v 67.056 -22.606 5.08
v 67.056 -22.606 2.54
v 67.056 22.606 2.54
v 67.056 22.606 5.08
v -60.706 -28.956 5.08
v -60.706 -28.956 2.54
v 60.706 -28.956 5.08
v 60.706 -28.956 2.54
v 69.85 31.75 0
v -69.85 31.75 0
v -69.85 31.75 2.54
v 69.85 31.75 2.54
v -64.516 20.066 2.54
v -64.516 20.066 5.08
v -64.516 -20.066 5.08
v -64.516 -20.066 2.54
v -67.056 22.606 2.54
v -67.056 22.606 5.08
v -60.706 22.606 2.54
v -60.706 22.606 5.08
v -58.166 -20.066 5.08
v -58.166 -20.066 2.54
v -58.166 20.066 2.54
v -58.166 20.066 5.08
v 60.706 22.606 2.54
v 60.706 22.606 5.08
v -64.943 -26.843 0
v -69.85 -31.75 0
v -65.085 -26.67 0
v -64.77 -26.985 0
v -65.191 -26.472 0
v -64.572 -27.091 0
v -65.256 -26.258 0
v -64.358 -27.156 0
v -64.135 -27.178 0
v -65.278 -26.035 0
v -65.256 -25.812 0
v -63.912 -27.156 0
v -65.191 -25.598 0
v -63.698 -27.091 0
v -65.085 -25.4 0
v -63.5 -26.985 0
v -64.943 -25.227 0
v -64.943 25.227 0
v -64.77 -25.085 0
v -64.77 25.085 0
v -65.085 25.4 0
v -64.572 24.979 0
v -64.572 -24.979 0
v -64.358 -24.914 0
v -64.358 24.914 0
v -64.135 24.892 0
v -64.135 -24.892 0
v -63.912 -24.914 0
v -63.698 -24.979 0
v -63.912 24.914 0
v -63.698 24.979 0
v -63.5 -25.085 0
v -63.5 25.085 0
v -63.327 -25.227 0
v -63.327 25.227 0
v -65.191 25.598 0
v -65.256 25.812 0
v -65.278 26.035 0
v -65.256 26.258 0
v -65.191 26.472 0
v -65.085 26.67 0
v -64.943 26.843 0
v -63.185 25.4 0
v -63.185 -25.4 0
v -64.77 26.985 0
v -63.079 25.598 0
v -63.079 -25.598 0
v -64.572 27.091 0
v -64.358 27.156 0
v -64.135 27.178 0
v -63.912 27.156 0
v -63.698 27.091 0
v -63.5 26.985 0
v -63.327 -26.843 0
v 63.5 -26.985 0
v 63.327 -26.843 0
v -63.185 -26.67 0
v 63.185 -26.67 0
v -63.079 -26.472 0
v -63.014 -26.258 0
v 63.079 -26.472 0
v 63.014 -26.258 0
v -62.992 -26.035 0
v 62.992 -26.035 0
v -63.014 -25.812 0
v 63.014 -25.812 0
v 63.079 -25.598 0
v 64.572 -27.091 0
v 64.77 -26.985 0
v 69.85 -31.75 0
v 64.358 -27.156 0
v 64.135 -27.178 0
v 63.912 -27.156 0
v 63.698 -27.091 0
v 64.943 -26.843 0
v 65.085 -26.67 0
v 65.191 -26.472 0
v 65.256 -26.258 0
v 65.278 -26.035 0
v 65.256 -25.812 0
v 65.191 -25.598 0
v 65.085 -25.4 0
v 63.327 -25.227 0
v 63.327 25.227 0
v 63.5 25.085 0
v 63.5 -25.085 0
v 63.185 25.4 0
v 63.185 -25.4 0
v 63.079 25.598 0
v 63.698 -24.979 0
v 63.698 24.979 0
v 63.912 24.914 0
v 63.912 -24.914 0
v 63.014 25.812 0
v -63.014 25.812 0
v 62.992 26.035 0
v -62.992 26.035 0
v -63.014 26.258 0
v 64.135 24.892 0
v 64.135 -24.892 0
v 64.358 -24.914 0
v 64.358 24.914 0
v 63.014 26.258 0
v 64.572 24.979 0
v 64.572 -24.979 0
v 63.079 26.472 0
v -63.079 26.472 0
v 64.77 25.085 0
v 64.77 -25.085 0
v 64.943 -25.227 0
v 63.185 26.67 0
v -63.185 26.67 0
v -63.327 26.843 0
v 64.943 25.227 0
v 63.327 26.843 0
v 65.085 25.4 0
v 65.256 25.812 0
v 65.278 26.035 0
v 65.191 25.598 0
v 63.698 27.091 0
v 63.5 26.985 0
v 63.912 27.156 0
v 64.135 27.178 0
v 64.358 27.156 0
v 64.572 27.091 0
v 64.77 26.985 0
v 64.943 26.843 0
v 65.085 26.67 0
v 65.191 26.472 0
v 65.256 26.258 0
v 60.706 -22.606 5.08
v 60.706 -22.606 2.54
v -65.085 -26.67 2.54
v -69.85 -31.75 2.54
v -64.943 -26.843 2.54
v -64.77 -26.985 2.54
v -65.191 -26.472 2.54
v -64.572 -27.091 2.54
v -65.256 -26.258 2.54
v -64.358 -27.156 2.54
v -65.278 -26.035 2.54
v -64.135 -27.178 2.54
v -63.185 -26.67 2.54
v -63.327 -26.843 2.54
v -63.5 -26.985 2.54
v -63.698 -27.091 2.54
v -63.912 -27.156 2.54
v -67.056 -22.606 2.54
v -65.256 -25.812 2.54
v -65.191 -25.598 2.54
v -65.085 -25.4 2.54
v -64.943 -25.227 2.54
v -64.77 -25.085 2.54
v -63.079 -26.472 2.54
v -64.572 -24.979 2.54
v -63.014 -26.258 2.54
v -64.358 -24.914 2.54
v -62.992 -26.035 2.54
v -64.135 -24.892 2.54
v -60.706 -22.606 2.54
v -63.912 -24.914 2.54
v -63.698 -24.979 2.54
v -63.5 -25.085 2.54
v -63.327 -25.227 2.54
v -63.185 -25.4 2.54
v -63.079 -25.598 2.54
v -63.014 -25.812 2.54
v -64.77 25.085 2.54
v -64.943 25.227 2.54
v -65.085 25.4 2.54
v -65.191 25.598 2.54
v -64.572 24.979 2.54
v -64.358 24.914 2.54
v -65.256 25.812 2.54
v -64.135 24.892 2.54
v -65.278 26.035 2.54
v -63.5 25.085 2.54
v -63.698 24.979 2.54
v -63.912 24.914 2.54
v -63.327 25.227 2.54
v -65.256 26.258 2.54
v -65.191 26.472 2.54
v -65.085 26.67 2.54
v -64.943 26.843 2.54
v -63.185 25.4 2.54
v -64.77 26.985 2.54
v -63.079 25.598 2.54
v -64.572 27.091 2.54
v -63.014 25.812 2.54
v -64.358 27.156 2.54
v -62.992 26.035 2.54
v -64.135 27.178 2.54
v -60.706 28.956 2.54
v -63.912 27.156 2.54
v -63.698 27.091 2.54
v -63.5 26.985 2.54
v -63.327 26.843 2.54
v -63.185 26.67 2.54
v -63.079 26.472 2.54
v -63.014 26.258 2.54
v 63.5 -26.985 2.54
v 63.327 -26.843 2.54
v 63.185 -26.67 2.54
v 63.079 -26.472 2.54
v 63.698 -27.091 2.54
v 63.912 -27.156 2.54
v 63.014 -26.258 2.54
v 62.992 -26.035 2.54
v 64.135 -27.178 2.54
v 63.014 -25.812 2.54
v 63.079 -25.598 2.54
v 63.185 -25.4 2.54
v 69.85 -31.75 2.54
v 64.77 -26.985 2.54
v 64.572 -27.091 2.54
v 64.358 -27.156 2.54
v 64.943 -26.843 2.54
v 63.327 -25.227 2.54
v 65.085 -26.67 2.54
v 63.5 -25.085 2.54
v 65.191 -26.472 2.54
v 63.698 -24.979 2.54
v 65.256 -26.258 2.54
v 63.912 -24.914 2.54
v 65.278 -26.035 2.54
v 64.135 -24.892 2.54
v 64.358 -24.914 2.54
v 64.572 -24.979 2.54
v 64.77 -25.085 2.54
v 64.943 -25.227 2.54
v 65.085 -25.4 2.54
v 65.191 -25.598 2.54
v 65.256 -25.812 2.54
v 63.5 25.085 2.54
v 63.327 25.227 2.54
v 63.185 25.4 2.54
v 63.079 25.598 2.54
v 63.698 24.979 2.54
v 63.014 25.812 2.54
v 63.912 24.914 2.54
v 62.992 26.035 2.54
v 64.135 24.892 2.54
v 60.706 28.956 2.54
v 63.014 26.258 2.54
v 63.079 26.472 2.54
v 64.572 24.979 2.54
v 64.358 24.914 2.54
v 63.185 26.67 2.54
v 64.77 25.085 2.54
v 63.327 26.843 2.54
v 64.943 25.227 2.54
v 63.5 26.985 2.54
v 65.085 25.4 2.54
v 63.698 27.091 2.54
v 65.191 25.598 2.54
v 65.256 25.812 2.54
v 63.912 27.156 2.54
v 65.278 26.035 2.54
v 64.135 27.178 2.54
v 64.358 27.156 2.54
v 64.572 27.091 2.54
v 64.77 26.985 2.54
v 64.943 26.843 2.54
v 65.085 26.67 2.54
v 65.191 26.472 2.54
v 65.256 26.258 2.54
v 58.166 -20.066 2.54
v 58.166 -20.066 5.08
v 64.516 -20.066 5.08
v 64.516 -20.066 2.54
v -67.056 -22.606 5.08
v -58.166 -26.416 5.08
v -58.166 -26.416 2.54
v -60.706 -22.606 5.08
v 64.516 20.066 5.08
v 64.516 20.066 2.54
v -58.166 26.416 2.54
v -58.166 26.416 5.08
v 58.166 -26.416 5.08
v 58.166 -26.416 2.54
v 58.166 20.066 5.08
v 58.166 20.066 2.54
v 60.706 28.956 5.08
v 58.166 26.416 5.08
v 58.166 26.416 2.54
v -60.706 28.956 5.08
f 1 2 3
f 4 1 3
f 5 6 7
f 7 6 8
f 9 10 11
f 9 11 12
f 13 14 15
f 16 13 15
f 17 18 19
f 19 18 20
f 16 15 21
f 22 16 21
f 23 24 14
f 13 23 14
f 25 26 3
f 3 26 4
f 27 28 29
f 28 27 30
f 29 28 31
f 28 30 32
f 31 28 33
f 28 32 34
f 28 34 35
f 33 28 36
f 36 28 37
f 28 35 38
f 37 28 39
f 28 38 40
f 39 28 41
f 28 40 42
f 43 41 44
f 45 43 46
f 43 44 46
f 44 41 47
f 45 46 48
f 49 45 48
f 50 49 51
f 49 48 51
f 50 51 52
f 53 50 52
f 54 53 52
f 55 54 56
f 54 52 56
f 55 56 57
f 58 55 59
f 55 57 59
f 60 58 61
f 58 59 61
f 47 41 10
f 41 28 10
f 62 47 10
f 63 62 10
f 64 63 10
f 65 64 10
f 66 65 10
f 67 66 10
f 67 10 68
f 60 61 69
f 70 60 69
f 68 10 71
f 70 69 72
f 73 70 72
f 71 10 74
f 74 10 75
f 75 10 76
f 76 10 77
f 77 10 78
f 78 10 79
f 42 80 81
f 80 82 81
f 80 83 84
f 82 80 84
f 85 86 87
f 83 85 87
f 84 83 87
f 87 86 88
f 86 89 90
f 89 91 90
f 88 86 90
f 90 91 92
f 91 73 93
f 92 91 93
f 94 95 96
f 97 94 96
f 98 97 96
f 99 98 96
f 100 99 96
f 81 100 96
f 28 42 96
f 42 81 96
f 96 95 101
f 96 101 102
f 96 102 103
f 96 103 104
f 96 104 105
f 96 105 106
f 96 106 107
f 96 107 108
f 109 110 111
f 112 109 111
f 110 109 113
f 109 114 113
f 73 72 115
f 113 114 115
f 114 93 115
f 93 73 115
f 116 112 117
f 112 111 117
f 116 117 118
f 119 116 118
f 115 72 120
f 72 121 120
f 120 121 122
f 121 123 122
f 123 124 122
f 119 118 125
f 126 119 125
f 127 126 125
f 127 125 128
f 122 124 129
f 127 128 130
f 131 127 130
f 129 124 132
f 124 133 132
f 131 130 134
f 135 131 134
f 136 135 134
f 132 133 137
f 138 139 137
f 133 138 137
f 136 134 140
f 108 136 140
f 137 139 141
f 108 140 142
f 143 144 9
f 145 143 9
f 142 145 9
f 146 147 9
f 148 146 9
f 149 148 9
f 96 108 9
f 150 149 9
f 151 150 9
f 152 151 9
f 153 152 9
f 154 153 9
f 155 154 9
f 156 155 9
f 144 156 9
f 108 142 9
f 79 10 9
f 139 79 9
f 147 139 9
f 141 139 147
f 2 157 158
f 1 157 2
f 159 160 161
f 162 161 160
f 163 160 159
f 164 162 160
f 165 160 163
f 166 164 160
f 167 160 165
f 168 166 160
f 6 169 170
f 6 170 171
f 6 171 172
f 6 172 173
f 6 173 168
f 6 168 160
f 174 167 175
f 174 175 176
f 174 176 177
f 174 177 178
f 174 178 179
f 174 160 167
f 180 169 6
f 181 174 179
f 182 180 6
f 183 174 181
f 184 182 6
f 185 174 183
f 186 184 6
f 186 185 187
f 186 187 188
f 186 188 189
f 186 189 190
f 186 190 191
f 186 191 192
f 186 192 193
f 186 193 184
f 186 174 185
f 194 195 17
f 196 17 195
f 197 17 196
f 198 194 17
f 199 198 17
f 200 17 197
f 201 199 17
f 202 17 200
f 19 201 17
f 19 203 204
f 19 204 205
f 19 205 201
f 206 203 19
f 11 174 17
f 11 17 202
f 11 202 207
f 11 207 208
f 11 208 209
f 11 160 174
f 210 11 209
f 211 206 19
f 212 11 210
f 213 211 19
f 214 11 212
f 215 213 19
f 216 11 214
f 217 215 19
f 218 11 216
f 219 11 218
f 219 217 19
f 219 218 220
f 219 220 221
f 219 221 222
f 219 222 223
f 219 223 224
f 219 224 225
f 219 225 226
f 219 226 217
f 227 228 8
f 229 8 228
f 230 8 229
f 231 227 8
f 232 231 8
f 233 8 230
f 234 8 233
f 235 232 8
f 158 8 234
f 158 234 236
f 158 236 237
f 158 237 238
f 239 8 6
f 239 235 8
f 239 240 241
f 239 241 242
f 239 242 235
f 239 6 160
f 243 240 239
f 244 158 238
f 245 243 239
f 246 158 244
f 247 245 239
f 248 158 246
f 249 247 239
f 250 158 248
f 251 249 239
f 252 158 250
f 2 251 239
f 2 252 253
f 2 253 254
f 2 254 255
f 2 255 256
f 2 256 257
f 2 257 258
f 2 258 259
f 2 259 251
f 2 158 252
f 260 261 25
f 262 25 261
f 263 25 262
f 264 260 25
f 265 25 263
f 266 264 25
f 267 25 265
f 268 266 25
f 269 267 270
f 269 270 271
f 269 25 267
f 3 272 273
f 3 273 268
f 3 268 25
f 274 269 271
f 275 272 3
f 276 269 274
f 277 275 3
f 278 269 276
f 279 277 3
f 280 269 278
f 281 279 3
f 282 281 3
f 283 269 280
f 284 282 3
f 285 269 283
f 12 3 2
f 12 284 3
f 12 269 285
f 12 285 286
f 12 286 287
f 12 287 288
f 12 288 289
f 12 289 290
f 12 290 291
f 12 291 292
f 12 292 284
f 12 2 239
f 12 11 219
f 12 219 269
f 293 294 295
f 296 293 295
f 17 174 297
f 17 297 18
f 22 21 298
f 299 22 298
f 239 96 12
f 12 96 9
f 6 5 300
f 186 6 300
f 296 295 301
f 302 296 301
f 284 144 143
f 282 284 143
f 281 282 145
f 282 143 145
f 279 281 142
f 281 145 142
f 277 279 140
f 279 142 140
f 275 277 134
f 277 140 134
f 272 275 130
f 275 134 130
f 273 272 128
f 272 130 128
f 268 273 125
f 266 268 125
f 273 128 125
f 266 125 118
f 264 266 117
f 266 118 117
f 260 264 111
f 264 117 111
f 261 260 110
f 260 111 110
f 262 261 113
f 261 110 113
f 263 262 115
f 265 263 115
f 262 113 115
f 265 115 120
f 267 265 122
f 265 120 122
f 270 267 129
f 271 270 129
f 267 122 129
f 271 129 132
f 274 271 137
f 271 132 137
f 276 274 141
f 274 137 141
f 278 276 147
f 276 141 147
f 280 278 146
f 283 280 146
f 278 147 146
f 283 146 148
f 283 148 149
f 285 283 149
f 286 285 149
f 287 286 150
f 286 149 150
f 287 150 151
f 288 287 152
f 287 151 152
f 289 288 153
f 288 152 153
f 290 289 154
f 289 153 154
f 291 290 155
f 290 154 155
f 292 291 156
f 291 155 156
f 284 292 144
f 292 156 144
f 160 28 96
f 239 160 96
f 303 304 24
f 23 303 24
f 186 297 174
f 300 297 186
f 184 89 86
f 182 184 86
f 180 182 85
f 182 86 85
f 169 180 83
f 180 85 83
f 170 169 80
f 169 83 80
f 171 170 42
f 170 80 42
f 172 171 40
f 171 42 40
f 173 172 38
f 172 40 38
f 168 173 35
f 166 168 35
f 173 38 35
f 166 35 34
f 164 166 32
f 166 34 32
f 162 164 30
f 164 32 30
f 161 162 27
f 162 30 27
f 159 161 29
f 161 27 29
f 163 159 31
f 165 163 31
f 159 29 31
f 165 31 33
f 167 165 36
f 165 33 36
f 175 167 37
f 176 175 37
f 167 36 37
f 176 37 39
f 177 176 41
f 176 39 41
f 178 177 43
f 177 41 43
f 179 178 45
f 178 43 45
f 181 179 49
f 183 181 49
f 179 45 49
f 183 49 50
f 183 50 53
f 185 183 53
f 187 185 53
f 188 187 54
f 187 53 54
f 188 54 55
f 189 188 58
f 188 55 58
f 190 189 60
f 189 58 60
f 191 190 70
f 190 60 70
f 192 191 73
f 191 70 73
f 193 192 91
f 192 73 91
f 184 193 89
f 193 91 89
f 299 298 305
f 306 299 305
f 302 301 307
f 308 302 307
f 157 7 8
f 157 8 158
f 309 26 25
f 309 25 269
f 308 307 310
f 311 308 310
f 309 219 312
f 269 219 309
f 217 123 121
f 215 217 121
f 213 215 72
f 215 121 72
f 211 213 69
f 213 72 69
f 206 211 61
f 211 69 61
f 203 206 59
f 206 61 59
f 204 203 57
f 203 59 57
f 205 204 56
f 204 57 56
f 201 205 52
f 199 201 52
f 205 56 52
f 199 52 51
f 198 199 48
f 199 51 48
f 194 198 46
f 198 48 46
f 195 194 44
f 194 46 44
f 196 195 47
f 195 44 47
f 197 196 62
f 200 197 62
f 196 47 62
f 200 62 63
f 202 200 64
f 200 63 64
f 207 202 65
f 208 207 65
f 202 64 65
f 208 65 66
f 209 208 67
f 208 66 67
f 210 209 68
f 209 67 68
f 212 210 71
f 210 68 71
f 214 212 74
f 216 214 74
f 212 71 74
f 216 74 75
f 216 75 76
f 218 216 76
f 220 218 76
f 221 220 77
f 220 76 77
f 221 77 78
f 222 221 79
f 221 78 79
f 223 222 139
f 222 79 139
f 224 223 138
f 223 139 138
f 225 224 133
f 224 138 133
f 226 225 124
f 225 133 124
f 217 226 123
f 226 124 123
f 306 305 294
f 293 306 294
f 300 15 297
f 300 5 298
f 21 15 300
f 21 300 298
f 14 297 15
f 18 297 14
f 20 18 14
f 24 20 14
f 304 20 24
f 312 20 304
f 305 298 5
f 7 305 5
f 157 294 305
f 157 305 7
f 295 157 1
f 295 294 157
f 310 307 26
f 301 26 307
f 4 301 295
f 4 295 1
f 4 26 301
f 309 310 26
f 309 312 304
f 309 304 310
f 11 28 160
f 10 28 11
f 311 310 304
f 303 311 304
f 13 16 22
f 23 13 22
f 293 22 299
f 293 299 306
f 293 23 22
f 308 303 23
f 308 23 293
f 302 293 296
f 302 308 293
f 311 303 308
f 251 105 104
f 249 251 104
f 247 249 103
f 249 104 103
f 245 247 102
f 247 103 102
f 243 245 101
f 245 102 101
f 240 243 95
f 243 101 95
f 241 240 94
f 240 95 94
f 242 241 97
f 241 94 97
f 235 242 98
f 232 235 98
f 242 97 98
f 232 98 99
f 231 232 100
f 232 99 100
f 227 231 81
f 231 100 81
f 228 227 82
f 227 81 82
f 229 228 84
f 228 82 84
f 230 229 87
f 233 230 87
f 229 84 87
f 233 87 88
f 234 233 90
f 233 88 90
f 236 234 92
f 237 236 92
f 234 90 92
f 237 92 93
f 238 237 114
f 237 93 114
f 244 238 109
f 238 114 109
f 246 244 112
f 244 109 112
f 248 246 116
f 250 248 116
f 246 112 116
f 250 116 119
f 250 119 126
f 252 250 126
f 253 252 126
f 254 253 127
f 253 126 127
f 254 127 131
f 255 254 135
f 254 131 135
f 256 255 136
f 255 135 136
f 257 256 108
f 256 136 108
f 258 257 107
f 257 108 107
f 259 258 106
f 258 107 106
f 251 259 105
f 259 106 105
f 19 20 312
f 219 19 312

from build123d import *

# Parameters (mm, degrees)
F0_W     = 139.7
F0_H     = 63.5
F1_DEPTH = 2.54
F2_W     = 134.112
F2_H     = 57.912
F3_DEPTH = 2.54
F4_W     = 6.35
F4_H     = 6.35
F5_DEPTH = 2.54
F7_DEPTH = 2.54
F8_R     = 1.143
F9_DEPTH = 2.54


with BuildPart() as f1:
    # F0 (on Top) → F1 (new body)
    with BuildSketch(Plane.XY):
        Rectangle(F0_W, F0_H)
    extrude(amount=F1_DEPTH)

    # F2 (on face) → F3 (join)
    with BuildSketch(Plane.XY.offset(2.54)):
        Rectangle(F2_W, F2_H)
    extrude(amount=F3_DEPTH)

    # F4 (on face) → F5 (cut)
    with BuildSketch(Plane.XY.offset(5.08)):
        with Locations((-63.881, 25.781)):
            Rectangle(F4_W, F4_H)
        with Locations((63.881, 25.781)):
            Rectangle(F4_W, F4_H)
        with Locations((-63.881, -25.781)):
            Rectangle(F4_W, F4_H)
        with Locations((63.881, -25.781)):
            Rectangle(F4_W, F4_H)
    extrude(amount=-F5_DEPTH, mode=Mode.SUBTRACT)

    # F6 (on face) → F7 (cut)
    with BuildSketch(Plane.XY.offset(5.08)):
        Polygon((64.516, 20.066), (58.166, 20.066), (58.166, 26.416), (-58.166, 26.416), (-58.166, 20.066), (-64.516, 20.066), (-64.516, -20.066), (-58.166, -20.066), (-58.166, -26.416), (58.166, -26.416), (58.166, -20.066), (64.516, -20.066), align=None)
    extrude(amount=-F7_DEPTH, mode=Mode.SUBTRACT)

    # F8 (on face) → F9 (cut, through all)
    with BuildSketch(Plane(origin=(0, 0, 0), x_dir=(1, 0, 0), z_dir=(0, 0, -1))):
        with Locations((64.135, 26.035)):
            Circle(F8_R)
        with Locations((-64.135, 26.035)):
            Circle(F8_R)
        with Locations((64.135, -26.035)):
            Circle(F8_R)
        with Locations((-64.135, -26.035)):
            Circle(F8_R)
    extrude(amount=-F9_DEPTH, mode=Mode.SUBTRACT)


solid = f1.part
